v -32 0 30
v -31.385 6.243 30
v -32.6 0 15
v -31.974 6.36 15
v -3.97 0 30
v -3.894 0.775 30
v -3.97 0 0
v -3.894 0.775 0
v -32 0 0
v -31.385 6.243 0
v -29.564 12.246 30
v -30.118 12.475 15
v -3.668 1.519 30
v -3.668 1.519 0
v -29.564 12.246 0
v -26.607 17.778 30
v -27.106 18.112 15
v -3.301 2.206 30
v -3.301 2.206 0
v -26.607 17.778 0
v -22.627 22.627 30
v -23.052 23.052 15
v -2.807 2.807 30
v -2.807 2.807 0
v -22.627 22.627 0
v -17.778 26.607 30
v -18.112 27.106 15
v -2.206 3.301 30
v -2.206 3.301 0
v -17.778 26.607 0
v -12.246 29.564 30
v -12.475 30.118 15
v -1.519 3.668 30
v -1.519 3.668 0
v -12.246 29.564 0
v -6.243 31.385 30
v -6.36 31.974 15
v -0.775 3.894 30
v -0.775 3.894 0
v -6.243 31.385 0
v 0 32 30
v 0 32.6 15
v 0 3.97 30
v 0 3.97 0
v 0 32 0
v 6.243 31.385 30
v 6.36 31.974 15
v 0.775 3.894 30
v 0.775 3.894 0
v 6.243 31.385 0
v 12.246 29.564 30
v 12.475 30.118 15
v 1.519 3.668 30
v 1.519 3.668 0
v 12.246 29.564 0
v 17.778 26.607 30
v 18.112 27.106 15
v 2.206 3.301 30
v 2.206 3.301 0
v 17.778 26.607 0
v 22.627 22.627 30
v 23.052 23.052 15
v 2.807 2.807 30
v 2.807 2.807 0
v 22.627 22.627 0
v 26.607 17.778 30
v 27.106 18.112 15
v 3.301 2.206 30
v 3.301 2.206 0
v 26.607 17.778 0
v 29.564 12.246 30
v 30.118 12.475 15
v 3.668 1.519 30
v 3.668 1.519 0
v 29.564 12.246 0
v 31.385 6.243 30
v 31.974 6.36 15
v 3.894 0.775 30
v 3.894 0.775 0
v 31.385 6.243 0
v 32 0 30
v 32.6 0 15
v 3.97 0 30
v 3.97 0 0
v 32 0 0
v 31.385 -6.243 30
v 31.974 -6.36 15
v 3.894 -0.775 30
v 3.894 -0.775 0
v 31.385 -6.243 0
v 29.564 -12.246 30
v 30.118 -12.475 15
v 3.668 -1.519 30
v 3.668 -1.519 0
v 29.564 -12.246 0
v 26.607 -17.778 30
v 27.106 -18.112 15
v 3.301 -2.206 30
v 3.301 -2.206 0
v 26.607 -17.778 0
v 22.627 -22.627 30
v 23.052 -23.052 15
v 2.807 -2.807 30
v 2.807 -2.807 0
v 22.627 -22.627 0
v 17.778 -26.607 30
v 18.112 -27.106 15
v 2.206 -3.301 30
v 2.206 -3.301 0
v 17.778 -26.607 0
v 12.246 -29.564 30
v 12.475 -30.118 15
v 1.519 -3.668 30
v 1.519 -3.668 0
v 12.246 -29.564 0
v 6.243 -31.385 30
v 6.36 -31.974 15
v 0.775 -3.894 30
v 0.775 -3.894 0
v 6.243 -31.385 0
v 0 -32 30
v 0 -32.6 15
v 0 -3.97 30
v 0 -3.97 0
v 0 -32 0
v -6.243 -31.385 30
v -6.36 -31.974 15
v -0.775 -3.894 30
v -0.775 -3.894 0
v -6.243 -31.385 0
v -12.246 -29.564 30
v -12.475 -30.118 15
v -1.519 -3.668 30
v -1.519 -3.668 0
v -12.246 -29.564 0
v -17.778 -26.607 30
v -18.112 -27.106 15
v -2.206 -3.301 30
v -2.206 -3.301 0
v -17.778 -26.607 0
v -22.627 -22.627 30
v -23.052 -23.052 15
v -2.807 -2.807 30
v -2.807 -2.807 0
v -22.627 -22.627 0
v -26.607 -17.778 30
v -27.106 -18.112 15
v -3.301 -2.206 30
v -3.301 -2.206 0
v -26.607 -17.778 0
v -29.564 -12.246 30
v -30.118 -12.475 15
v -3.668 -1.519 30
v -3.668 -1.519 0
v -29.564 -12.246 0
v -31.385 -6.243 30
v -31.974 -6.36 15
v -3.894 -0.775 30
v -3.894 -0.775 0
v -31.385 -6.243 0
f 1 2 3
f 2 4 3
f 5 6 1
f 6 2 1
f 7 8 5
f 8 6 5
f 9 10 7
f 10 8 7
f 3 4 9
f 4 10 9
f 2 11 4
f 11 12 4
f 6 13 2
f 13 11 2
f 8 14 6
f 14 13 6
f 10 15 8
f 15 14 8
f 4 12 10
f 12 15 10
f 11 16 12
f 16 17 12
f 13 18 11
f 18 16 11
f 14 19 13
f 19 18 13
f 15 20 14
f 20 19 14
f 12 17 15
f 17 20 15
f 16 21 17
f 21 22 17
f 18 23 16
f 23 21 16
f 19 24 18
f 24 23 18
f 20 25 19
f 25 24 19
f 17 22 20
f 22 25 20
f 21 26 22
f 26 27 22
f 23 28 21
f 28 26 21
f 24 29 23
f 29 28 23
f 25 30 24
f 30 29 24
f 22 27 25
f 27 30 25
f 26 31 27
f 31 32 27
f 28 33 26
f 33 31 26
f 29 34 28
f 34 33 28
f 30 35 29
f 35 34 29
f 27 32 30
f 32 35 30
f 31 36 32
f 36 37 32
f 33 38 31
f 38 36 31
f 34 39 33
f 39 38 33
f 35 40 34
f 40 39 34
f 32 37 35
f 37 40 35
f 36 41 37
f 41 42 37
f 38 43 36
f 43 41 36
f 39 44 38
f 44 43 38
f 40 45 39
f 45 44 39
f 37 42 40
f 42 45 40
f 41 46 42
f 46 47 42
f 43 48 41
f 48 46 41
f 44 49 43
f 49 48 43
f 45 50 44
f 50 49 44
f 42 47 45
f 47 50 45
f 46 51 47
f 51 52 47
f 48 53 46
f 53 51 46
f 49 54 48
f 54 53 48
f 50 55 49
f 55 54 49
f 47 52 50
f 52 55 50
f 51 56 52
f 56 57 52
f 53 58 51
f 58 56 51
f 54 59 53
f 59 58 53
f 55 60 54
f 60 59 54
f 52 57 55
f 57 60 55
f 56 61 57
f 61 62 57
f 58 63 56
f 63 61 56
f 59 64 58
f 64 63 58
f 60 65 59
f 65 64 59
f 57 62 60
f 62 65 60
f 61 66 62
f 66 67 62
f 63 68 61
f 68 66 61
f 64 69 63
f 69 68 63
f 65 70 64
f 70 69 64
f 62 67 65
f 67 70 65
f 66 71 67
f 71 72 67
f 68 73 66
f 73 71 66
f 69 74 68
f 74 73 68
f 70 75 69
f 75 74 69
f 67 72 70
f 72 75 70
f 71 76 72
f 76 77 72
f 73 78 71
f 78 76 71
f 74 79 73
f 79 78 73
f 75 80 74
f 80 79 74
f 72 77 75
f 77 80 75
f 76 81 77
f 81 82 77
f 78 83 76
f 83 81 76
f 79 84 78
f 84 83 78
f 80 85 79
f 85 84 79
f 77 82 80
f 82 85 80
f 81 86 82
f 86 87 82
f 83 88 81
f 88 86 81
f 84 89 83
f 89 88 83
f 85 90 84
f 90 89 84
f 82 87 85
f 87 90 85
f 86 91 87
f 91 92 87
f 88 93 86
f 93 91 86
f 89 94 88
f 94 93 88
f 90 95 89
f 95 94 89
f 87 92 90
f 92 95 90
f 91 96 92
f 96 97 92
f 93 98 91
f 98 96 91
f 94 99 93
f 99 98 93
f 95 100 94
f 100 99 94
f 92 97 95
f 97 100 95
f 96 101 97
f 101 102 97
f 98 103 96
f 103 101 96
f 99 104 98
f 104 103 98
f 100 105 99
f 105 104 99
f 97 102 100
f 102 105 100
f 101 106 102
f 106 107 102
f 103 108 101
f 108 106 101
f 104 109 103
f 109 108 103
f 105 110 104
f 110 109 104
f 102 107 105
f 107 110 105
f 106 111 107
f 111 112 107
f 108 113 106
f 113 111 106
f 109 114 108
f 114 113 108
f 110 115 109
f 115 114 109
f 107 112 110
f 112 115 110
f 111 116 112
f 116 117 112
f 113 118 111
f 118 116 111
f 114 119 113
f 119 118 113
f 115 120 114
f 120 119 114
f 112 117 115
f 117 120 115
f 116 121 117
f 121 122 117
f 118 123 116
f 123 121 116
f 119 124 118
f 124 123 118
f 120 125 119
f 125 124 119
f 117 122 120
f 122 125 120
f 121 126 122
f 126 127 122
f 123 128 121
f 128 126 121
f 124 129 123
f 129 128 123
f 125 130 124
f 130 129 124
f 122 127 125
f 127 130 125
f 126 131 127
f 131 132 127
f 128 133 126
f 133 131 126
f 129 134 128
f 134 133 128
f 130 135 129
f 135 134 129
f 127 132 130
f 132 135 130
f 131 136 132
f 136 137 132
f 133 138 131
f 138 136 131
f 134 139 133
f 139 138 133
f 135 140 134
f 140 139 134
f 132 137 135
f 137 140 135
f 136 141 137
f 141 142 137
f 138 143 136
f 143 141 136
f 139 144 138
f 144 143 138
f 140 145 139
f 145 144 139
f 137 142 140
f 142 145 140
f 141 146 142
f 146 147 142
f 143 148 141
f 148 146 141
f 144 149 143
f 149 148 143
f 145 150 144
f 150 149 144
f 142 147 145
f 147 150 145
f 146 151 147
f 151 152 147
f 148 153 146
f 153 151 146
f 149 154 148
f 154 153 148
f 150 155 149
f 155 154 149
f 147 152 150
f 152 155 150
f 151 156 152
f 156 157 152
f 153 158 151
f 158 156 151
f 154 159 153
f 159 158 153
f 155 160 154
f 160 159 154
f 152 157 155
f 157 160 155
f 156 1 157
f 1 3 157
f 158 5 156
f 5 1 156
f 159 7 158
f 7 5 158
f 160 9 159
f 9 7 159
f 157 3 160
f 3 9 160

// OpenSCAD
$fn = 32;

// ----------------------------------------------------------------------
// Belt roller: 64 mm barrel, 30 mm wide, bore 7.94 mm
// ----------------------------------------------------------------------

// --- parameters (mm) ---
bore_d = 7.94;            // bore
barrel_d = 64;            // barrel diameter
roller_w = 30;            // roller width
crown = 0.6;              // crown height at mid width

roller_profile = [[3.97, 0], [32, 0], [32.6, 15], [32, 30], [3.97, 30]];

/* the profile stays clear of the axis, so the bore comes out of the revolve */
rotate_extrude() polygon(roller_profile);
